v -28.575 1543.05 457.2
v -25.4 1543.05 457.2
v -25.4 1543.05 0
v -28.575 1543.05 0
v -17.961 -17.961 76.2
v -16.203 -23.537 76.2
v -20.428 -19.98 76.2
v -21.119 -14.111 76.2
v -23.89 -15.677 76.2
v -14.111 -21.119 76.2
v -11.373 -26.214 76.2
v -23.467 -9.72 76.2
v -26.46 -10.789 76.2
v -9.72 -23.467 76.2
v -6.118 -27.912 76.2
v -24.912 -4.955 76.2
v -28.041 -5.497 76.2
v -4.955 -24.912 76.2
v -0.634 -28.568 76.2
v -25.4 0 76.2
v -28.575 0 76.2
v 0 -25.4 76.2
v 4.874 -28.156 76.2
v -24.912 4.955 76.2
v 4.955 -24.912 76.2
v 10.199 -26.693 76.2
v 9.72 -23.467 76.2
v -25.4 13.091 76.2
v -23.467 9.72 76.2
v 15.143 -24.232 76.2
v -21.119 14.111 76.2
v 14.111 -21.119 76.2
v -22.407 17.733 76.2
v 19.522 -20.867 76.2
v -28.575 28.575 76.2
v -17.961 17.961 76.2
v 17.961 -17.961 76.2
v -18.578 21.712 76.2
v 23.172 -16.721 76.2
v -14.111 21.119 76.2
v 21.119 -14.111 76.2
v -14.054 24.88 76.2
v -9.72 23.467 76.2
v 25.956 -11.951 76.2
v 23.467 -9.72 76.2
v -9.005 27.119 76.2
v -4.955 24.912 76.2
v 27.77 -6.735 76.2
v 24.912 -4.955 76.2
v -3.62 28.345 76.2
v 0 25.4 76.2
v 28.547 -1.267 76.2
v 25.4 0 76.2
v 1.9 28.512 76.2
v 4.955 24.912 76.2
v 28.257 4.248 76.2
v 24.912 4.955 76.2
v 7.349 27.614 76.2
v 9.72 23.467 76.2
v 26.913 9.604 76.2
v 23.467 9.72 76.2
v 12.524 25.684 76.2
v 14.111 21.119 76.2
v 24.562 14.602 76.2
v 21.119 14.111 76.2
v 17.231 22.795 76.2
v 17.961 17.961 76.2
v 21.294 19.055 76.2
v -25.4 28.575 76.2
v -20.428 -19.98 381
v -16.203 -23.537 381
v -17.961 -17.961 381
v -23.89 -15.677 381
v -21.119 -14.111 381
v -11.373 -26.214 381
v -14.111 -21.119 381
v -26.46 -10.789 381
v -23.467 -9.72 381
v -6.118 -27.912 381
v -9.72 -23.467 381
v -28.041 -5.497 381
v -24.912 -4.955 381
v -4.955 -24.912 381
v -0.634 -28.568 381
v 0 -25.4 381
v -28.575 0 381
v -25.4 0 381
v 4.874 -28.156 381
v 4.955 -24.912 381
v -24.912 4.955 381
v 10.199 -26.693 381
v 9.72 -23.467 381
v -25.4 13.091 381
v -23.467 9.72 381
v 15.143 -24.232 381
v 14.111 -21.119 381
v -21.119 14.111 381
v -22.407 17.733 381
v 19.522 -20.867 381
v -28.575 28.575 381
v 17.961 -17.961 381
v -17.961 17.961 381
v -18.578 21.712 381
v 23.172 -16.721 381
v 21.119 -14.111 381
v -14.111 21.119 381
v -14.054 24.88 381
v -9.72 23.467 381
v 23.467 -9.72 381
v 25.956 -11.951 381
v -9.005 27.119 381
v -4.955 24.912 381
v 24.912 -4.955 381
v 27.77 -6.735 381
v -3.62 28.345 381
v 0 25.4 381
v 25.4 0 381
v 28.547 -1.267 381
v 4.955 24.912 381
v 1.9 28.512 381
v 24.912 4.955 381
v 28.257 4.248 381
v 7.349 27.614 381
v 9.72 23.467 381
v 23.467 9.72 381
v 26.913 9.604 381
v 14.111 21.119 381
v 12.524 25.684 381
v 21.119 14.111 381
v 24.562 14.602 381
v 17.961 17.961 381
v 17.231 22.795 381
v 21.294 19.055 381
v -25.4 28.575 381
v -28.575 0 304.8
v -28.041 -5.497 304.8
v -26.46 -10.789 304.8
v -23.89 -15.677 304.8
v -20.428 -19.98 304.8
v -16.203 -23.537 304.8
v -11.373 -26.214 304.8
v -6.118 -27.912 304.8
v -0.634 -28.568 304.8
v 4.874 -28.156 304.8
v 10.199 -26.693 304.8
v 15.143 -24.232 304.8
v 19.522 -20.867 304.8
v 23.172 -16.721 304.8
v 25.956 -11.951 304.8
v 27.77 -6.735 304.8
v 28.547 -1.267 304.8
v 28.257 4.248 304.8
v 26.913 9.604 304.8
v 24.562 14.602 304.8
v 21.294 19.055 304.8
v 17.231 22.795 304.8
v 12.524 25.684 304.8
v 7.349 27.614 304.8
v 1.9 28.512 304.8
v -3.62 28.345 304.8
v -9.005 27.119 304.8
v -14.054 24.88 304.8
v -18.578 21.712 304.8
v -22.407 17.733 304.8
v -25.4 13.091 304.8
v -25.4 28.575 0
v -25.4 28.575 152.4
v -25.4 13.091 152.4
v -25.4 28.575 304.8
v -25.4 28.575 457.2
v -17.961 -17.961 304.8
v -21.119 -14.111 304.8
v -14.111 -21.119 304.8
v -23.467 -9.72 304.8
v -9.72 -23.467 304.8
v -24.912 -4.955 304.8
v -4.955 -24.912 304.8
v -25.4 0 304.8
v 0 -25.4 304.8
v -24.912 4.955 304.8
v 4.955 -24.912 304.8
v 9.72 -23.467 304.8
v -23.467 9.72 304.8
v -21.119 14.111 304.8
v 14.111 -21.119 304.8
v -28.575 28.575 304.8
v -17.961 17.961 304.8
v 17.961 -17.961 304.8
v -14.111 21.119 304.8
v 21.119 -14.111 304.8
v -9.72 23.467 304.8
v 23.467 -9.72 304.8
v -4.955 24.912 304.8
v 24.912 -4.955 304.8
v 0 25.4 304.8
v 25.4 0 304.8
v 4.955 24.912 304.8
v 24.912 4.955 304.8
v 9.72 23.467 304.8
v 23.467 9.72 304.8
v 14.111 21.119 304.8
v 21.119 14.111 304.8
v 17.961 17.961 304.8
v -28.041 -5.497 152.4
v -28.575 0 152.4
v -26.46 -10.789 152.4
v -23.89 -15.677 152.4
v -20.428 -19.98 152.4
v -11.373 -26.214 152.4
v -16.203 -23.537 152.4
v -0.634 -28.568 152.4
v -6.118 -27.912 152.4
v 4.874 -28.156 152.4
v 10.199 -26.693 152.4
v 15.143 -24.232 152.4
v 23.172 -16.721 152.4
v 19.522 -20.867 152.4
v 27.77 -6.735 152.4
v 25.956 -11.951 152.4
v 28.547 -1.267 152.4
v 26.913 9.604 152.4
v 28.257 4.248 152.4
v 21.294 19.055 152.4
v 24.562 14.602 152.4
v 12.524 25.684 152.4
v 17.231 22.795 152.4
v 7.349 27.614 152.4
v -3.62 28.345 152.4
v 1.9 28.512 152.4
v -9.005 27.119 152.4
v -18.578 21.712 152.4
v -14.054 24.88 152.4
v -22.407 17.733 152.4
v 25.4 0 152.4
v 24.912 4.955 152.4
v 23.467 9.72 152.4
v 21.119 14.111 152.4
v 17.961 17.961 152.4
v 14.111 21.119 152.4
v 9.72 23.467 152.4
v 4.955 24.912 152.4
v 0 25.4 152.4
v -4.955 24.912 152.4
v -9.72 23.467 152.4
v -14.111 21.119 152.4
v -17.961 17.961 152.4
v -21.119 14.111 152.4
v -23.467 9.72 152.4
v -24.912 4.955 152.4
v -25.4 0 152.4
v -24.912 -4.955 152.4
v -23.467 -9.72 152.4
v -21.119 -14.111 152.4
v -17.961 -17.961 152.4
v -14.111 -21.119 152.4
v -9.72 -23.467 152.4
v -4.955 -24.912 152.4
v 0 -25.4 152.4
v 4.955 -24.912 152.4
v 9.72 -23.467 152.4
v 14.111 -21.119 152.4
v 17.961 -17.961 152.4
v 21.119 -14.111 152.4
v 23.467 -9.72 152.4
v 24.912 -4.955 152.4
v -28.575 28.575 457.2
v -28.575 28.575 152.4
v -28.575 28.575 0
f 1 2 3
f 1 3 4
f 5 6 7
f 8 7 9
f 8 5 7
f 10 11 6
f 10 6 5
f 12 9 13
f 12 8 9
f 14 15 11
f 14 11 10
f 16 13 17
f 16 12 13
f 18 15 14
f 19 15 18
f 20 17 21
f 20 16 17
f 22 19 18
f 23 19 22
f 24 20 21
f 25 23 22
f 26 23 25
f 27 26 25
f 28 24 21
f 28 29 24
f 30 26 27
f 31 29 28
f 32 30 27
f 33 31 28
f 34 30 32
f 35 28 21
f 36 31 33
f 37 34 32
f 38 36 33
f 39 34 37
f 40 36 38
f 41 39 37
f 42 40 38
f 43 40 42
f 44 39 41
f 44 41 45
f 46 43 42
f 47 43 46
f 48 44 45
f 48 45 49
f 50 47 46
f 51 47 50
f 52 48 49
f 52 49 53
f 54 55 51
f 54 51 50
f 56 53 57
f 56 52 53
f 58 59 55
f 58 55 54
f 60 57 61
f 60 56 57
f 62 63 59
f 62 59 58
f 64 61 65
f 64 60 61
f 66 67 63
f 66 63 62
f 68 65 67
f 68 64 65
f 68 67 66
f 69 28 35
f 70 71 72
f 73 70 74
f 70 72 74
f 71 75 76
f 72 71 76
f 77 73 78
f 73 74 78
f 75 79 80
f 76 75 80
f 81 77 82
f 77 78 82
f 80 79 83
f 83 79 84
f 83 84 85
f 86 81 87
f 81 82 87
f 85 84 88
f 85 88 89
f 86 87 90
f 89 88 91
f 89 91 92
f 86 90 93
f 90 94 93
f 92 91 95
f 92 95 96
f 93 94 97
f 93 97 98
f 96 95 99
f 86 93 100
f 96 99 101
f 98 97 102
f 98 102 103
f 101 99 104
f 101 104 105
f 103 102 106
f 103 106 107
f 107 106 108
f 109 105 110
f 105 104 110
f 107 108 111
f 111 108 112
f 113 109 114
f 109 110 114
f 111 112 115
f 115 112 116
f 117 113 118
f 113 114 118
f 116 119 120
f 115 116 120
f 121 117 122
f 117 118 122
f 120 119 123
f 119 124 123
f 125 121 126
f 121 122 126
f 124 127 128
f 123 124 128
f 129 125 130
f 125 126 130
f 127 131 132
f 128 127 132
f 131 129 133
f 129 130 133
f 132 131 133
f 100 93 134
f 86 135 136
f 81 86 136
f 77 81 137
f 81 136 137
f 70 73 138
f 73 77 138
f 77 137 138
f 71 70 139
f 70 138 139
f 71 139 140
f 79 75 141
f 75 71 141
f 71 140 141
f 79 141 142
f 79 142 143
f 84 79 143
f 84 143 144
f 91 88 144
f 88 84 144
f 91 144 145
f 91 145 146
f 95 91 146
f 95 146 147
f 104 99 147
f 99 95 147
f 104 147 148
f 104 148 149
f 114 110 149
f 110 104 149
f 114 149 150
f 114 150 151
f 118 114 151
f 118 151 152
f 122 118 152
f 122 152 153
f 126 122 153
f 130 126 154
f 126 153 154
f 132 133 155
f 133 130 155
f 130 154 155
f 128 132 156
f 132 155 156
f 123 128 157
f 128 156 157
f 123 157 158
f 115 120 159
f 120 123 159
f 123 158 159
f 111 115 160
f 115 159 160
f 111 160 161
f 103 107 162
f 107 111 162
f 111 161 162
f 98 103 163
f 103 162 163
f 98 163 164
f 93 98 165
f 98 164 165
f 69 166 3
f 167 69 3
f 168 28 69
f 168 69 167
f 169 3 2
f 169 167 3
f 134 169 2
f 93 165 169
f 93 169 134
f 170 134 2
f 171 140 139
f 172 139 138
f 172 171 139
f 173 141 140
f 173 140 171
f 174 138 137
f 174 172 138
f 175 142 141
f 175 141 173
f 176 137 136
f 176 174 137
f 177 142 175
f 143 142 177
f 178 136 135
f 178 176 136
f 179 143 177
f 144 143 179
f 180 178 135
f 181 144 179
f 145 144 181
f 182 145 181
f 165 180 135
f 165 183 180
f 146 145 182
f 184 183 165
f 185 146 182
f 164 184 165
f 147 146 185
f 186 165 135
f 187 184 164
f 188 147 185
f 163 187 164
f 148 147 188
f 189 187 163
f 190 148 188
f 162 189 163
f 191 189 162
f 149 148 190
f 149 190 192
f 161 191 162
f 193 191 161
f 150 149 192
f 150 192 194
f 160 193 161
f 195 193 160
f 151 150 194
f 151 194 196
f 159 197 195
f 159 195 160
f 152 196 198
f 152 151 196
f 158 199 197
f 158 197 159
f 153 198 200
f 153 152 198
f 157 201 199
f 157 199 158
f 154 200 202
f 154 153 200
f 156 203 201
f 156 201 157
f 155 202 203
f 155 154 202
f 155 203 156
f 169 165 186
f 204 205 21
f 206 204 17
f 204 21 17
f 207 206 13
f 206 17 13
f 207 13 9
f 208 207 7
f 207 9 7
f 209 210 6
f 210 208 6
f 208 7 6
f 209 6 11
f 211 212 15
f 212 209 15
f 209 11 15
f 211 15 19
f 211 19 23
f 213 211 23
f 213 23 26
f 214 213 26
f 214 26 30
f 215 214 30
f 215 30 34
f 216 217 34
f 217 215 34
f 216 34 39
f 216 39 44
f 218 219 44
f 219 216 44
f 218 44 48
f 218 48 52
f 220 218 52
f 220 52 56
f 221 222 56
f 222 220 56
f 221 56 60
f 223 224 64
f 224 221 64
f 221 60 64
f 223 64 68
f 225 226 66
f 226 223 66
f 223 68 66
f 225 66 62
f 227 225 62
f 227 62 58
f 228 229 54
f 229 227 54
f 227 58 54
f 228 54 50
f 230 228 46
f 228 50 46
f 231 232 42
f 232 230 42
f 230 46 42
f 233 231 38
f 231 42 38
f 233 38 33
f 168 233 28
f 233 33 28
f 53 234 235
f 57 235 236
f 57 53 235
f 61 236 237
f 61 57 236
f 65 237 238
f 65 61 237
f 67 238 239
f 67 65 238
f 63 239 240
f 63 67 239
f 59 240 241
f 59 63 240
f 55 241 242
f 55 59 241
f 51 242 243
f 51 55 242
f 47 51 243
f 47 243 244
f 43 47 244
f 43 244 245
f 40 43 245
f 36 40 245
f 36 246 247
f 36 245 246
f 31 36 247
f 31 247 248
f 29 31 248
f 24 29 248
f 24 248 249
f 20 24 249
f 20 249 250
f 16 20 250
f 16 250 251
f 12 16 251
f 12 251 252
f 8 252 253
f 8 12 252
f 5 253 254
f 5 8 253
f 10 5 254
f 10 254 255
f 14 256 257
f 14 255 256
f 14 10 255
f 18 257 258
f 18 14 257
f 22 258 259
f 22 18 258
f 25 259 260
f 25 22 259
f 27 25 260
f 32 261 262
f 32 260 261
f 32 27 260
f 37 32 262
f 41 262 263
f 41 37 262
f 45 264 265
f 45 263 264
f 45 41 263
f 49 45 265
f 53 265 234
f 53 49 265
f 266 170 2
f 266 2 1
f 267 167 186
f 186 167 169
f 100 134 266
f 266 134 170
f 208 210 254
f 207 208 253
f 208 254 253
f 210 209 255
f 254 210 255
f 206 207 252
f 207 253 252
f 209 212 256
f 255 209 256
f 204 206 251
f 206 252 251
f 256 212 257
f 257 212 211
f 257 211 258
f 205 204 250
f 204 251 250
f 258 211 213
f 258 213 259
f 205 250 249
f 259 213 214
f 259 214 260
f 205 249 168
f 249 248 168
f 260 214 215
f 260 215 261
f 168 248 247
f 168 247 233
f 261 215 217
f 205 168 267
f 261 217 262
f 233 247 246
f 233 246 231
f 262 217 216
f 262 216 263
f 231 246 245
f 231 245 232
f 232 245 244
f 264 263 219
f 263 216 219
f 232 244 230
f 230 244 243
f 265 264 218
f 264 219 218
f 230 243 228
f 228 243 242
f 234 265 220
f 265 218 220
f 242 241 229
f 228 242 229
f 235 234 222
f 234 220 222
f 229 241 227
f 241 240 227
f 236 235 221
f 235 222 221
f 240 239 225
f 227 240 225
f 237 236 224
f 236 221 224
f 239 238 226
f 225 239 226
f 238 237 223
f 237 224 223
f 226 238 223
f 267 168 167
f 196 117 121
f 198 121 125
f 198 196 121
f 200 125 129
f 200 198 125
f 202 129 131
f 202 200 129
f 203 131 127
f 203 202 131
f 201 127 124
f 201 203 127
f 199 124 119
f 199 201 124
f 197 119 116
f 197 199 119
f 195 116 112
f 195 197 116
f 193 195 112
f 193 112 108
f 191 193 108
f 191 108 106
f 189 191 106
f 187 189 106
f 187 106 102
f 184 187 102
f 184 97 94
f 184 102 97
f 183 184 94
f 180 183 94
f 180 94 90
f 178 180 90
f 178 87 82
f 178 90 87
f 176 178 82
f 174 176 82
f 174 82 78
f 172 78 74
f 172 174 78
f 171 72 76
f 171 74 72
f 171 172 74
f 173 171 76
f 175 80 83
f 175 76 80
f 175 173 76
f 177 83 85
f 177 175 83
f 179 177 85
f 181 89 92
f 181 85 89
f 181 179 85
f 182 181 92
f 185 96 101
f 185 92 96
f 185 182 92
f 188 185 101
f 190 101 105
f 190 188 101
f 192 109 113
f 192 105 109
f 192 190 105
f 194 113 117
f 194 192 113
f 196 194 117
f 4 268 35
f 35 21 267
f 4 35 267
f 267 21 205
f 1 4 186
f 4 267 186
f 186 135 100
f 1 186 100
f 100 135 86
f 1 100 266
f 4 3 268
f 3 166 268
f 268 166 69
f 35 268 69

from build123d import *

# Parameters (mm, degrees)
F0_R          = 25.4
F1_DEPTH      = 457.2
F2_W          = 57.15
F2_H          = 76.2
F2_H_2        = 152.4
F2_H_3        = 79.4389369488
F3_DEPTH      = 28.576
F3_DEPTH_BACK = 28.576
F4_W          = 3.175
F4_H          = 457.2
F5_DEPTH      = 742.95


with BuildPart() as f1:
    # F0 (on Top) → F1 (new body)
    with BuildSketch(Plane.XY):
        with BuildLine():
            Line((-28.575, 800.1), (-28.575, 0))
            ThreePointArc((-28.575, 0), (27.7699083992, -6.7351920908), (-25.4, 13.0908603613))
            Line((-25.4, 13.0908603613), (-25.4, 800.1))
            Line((-25.4, 800.1), (-28.575, 800.1))
        make_face()
        Circle(F0_R, mode=Mode.SUBTRACT)
    extrude(amount=F1_DEPTH)

    # F2 (on Right) → F3 (cut, two sides)
    with BuildSketch(Plane.YZ) as f3_sk:
        with Locations((0, 38.1)):
            Rectangle(F2_W, F2_H)
        with Locations((0, 228.6)):
            Rectangle(F2_W, F2_H_2)
        with Locations((0, 420.7194684744)):
            Rectangle(F2_W, F2_H_3)
    extrude(amount=-F3_DEPTH, mode=Mode.SUBTRACT)
    extrude(f3_sk.sketch, amount=F3_DEPTH_BACK, mode=Mode.SUBTRACT)

    # F4 (on face) → F5 (join)
    with BuildSketch(Plane(origin=(0, 800.1, 0), x_dir=(-1, 0, 0), z_dir=(0, 1, 0))):
        with Locations((26.9875, 228.6)):
            Rectangle(F4_W, F4_H)
    extrude(amount=F5_DEPTH)


solid = f1.part
